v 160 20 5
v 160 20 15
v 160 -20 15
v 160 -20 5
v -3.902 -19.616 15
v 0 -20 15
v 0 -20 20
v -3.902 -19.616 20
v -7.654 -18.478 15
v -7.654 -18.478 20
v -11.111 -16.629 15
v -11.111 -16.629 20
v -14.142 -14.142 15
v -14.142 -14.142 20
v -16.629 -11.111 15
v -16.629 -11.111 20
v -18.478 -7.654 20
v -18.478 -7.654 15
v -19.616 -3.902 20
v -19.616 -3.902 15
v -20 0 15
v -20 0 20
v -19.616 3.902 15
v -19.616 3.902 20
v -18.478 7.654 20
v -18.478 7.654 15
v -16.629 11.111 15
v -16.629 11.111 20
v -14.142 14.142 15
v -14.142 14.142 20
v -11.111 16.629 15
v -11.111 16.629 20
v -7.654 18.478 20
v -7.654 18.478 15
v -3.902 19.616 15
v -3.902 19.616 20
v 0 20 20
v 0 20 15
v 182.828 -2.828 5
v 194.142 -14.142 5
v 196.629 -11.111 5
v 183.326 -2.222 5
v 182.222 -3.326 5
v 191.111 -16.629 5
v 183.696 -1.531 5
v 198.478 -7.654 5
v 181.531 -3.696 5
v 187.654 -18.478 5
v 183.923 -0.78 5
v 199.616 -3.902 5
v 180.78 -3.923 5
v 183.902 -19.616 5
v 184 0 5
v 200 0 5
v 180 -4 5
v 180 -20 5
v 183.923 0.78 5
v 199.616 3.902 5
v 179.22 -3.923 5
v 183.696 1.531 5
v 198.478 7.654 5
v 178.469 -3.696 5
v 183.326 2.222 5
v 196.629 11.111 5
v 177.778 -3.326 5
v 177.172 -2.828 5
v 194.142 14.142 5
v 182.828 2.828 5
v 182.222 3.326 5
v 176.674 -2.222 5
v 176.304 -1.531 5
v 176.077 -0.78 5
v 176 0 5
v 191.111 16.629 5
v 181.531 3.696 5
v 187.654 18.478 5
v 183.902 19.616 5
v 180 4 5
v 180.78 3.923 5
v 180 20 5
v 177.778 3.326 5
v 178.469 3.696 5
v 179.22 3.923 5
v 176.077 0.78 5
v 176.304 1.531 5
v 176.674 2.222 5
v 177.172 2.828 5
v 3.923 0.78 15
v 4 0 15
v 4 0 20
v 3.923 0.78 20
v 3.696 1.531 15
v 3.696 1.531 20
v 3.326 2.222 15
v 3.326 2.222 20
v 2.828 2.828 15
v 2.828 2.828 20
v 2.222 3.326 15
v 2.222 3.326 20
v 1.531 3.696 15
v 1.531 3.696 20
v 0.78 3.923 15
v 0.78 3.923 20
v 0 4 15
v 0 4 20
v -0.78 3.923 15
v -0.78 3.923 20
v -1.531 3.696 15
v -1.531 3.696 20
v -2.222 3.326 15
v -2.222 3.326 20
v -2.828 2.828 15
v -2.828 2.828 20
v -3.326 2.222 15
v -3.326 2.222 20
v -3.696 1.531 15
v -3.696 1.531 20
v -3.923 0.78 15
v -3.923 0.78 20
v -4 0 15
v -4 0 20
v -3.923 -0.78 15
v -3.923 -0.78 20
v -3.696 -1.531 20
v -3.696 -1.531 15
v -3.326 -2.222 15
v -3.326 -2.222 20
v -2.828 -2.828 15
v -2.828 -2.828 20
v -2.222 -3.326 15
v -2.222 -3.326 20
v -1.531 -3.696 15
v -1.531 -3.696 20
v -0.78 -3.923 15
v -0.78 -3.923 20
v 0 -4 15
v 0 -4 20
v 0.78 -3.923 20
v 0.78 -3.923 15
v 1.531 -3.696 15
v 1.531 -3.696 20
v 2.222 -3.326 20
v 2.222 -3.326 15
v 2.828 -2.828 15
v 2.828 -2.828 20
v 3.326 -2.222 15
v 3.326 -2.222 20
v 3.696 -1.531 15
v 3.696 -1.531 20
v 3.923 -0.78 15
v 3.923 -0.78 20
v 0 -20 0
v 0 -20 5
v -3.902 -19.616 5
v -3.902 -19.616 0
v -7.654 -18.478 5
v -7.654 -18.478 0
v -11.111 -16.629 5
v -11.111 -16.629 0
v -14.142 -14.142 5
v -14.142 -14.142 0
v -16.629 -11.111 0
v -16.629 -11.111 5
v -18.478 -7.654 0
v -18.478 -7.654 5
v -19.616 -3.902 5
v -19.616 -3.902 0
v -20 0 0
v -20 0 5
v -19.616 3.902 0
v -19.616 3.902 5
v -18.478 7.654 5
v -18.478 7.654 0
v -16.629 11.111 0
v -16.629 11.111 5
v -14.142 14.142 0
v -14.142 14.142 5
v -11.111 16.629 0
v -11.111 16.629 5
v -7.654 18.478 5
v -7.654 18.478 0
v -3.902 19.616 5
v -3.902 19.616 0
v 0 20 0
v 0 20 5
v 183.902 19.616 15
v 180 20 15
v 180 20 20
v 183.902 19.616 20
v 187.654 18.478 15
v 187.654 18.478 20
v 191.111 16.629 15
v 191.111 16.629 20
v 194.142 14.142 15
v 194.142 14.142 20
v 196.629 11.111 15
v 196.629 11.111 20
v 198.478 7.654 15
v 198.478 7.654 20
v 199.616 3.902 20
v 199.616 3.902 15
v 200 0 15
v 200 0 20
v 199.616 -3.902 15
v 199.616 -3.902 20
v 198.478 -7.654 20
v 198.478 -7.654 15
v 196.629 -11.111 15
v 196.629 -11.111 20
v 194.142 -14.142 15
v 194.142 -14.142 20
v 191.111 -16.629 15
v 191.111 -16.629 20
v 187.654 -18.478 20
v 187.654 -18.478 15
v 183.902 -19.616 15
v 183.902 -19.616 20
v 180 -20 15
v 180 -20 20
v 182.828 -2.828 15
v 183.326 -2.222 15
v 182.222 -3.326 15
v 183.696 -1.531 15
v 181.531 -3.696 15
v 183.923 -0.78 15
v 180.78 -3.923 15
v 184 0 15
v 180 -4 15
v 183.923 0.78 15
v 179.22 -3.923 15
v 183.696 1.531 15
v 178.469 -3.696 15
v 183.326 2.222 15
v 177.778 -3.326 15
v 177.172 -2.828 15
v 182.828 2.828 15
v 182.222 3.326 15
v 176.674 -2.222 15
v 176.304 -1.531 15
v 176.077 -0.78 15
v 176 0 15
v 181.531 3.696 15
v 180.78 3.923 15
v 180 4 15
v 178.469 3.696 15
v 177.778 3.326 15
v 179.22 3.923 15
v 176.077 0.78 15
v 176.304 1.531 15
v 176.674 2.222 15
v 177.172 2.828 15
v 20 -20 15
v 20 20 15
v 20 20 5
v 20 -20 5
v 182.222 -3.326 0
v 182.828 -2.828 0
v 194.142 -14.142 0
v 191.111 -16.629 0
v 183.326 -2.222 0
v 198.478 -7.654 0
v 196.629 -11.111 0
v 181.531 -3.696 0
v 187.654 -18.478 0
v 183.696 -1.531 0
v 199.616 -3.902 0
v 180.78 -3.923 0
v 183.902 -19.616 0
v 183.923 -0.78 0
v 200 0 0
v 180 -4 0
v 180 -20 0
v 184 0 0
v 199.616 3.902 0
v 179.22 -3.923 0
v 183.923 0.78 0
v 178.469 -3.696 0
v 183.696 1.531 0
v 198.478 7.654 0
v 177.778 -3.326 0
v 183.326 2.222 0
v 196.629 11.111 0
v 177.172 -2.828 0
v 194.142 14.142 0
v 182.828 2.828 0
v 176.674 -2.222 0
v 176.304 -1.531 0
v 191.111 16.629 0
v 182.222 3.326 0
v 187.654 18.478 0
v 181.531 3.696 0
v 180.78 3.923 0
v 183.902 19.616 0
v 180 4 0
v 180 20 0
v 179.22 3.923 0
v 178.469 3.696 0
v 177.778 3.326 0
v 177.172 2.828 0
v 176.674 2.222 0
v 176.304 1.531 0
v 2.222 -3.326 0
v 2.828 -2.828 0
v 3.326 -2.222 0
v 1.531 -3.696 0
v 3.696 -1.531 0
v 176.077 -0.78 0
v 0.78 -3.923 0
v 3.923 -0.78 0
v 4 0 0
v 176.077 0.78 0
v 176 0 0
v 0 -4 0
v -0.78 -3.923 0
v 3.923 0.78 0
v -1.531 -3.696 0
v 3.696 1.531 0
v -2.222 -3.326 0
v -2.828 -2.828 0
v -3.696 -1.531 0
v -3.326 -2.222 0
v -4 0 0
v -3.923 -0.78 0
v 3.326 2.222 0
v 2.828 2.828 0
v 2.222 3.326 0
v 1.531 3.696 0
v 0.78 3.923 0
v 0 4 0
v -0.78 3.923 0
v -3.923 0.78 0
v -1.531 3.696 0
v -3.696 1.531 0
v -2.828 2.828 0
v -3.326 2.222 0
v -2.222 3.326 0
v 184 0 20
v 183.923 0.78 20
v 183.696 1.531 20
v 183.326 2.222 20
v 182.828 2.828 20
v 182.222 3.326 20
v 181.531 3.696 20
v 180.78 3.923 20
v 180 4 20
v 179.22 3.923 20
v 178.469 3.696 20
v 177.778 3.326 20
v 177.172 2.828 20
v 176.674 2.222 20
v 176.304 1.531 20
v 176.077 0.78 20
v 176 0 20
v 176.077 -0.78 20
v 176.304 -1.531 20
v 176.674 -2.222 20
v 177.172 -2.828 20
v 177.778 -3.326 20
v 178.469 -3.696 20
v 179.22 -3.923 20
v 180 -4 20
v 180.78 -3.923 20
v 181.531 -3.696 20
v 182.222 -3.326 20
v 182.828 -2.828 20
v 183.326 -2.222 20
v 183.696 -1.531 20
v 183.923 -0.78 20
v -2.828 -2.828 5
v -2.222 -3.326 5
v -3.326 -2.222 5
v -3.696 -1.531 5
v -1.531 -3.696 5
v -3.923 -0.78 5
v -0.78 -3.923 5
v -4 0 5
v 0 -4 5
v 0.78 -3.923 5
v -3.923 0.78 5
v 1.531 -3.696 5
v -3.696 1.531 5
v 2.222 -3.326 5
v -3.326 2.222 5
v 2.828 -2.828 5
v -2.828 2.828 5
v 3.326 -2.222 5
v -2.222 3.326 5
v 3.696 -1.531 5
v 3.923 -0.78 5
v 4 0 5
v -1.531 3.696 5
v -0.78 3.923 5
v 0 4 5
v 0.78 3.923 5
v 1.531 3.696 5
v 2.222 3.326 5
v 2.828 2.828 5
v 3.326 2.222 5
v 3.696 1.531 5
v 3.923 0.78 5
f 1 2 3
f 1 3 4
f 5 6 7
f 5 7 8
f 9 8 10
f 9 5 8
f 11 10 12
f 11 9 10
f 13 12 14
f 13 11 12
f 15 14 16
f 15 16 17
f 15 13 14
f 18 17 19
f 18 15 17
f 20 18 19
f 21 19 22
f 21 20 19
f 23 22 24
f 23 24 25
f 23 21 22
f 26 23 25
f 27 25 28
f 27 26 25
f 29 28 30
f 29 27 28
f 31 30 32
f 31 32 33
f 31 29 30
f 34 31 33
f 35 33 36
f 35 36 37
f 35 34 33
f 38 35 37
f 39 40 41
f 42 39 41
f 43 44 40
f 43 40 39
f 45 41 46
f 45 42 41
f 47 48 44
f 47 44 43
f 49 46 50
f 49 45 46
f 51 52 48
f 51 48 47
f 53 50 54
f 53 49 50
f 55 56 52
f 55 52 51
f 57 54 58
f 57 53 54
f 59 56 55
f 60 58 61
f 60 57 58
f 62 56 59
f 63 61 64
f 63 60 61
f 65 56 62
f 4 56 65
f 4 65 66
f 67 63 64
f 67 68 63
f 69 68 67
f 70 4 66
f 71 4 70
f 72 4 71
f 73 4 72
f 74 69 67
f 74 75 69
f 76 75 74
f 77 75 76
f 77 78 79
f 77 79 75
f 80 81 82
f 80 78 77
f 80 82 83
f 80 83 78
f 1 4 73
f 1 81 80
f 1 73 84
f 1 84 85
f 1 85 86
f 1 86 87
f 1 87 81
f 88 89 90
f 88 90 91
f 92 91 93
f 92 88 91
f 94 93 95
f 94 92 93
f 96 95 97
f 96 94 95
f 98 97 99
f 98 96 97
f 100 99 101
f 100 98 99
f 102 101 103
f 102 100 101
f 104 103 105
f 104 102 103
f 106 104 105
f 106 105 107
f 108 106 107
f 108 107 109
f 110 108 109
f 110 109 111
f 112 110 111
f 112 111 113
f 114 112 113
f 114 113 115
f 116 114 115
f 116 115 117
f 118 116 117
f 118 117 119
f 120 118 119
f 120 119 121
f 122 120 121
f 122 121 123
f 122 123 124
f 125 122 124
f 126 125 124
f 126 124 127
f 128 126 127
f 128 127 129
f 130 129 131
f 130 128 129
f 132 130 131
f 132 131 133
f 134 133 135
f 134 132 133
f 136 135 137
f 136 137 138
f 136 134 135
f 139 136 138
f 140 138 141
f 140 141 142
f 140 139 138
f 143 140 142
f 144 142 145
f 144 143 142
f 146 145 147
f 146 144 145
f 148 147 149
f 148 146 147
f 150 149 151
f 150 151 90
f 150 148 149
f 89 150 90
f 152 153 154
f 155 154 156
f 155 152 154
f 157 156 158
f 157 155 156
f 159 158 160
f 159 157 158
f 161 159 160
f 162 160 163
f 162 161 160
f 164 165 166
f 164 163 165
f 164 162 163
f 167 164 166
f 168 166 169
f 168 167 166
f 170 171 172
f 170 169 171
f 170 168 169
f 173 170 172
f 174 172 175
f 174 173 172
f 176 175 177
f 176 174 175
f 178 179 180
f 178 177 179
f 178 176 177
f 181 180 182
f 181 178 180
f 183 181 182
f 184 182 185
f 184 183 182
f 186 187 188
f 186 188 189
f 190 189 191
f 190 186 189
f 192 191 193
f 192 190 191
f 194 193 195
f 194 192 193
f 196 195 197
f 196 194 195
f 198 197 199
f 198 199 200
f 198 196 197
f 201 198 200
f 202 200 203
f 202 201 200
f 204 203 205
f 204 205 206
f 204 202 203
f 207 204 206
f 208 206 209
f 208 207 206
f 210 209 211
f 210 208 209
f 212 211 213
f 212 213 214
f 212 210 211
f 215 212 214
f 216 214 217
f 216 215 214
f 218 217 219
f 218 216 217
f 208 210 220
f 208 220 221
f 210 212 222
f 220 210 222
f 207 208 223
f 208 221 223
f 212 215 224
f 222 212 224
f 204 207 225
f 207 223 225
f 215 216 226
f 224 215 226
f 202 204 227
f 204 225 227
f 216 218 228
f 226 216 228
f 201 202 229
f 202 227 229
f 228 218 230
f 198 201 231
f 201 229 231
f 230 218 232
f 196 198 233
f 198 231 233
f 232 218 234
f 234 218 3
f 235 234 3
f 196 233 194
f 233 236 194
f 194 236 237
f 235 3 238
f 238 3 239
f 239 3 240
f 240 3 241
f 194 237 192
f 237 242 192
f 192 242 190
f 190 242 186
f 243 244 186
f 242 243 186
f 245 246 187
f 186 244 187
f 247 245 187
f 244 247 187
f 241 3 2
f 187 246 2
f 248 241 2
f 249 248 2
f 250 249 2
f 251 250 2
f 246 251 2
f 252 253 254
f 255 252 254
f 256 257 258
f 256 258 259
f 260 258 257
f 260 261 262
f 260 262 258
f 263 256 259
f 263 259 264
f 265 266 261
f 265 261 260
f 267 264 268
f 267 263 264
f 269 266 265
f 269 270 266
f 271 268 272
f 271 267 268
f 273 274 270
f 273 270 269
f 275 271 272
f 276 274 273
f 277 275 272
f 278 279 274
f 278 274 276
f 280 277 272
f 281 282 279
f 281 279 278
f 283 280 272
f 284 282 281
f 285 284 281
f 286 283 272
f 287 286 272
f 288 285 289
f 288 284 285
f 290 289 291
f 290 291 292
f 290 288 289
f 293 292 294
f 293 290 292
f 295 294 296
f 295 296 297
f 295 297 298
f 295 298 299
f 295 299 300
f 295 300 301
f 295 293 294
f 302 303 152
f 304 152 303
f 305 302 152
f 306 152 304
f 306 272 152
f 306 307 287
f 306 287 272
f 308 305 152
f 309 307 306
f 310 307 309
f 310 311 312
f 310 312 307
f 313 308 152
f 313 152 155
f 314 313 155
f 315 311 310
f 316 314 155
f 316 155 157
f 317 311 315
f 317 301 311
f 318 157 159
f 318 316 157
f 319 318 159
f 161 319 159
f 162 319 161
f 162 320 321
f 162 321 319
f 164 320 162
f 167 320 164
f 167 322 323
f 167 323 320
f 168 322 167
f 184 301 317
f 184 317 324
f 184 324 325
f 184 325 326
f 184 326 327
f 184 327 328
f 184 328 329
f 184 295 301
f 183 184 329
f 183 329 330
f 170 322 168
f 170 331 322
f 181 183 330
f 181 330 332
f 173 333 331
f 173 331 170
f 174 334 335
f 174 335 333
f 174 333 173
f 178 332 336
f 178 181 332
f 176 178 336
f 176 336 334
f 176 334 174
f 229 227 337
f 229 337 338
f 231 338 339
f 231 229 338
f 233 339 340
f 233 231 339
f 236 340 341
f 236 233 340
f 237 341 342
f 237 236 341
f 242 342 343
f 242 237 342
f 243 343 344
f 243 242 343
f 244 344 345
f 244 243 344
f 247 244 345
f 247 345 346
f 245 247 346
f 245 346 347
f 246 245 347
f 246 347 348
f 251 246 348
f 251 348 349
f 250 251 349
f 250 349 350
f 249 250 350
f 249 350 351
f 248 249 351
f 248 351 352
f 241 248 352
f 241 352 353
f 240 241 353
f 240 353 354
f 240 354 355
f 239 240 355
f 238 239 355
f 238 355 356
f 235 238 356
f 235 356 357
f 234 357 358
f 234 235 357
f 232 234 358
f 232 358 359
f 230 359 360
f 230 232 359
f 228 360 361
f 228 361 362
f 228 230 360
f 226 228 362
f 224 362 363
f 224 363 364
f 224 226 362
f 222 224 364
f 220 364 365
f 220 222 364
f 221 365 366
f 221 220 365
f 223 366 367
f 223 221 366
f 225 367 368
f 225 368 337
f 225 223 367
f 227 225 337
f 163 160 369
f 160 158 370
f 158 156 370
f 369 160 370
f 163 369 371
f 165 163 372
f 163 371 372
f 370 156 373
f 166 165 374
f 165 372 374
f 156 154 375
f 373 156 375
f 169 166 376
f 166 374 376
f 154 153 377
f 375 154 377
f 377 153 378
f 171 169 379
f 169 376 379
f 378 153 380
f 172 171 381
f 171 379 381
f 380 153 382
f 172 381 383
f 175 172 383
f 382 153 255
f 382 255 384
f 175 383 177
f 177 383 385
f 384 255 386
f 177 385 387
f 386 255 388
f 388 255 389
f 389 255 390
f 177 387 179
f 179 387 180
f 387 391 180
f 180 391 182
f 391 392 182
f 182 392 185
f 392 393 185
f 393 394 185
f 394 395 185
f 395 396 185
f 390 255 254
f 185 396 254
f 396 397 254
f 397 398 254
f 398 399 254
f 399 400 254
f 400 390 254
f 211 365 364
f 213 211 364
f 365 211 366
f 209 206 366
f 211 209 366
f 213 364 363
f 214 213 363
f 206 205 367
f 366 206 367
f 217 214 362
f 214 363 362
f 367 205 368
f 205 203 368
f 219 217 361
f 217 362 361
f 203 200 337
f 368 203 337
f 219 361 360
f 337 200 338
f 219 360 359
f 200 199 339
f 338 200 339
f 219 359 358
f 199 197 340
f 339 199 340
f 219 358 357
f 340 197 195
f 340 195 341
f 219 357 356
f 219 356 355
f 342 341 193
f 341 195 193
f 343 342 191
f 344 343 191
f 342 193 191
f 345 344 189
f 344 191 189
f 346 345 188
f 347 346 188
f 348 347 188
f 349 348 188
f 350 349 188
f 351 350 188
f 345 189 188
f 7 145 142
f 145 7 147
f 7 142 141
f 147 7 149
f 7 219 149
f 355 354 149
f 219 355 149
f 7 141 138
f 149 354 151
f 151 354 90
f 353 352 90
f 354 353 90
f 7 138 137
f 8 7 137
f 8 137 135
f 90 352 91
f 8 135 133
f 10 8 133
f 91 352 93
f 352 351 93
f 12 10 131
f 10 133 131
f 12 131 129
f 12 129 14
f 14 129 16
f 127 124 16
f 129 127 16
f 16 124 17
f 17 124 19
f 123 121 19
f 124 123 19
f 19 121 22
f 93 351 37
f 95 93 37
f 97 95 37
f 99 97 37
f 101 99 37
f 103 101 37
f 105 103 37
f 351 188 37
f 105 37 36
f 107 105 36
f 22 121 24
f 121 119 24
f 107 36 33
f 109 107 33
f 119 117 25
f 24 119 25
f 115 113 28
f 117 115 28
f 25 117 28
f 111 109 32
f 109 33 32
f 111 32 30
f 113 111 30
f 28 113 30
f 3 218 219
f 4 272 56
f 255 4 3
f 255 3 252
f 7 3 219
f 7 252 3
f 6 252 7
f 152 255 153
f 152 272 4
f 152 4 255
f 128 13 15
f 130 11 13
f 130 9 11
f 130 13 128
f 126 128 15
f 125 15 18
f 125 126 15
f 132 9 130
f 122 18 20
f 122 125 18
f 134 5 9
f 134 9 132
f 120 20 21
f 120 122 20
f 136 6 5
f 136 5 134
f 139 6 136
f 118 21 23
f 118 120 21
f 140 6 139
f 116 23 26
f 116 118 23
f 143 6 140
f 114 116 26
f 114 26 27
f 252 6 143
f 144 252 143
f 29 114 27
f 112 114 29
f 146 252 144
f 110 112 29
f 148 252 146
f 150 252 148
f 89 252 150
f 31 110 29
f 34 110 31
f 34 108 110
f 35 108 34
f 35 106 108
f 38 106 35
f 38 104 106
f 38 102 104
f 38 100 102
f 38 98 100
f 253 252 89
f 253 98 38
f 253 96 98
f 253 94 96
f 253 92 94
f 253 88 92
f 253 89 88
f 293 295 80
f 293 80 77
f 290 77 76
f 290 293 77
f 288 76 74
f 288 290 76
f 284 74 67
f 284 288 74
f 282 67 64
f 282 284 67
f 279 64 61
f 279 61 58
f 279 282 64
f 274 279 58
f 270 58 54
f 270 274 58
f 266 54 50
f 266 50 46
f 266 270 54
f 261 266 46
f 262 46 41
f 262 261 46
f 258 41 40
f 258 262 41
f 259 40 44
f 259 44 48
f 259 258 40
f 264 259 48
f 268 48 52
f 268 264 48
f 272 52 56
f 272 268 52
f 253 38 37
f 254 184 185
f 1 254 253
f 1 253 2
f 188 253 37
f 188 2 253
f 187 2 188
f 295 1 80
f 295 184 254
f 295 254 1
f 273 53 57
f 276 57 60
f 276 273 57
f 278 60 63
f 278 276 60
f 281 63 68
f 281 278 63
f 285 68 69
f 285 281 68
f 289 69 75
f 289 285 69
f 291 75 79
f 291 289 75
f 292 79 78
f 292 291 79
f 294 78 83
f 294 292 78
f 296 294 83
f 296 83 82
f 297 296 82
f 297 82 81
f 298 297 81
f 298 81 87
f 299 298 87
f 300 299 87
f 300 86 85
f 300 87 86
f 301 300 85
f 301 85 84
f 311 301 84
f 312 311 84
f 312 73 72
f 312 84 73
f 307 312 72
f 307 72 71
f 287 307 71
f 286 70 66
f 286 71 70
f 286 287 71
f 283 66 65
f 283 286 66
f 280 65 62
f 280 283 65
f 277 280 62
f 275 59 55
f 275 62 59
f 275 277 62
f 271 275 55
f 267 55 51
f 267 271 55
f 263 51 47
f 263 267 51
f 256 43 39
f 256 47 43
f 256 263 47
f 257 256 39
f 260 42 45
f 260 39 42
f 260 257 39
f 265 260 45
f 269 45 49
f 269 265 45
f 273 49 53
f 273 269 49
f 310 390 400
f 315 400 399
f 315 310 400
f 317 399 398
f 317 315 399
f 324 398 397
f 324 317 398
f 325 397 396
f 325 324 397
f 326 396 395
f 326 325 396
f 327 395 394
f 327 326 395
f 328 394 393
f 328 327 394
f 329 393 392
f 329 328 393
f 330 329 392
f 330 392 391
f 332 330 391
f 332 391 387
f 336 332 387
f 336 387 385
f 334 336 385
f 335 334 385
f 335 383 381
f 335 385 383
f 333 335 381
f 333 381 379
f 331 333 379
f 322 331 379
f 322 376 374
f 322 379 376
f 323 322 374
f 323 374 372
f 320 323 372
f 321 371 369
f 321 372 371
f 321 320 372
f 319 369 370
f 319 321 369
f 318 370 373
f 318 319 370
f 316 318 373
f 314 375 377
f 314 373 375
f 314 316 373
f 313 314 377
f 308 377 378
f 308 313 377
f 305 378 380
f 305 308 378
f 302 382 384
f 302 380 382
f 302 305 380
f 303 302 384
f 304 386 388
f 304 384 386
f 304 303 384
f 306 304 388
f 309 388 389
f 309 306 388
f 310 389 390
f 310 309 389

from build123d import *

# Parameters (mm, degrees)
ESQUISSE1_R             = 4
BOSS_EXTRU_1_DEPTH      = 20
ESQUISSE2_W             = 10
ESQUISSE2_H             = 40
ENL_V_MAT_EXTRU_1_DEPTH = 20


with BuildPart() as part:
    # Esquisse1 → Boss.-Extru.1 (new body)
    with BuildSketch(Plane.XY):
        with BuildLine():
            Line((0, 20), (180, 20))
            ThreePointArc((180, 20), (200, 0), (180, -20))
            Line((180, -20), (0, -20))
            ThreePointArc((0, -20), (-20, 0), (0, 20))
        make_face()
        Circle(ESQUISSE1_R, mode=Mode.SUBTRACT)
        with Locations((180, 0)):
            Circle(ESQUISSE1_R, mode=Mode.SUBTRACT)
    extrude(amount=BOSS_EXTRU_1_DEPTH)

    # Esquisse2 → Enlèv. mat.-Extru.1 (cut, symmetric)
    with BuildSketch(Plane(origin=(0, 0, 0), x_dir=(0, 0, -1), z_dir=(1, 0, 0))):
        with Locations((-10, 0)):
            Rectangle(ESQUISSE2_W, ESQUISSE2_H)
    enl_v_mat_extru_1 = extrude(amount=ENL_V_MAT_EXTRU_1_DEPTH, both=True, mode=Mode.SUBTRACT)

    # Symétrie1: Enlèv. mat.-Extru.1 across plane
    add(enl_v_mat_extru_1.mirror(Plane(origin=(90, 0, 0), x_dir=(0, 0, 1), z_dir=(1, 0, 0))), mode=Mode.SUBTRACT)


solid = part.part
